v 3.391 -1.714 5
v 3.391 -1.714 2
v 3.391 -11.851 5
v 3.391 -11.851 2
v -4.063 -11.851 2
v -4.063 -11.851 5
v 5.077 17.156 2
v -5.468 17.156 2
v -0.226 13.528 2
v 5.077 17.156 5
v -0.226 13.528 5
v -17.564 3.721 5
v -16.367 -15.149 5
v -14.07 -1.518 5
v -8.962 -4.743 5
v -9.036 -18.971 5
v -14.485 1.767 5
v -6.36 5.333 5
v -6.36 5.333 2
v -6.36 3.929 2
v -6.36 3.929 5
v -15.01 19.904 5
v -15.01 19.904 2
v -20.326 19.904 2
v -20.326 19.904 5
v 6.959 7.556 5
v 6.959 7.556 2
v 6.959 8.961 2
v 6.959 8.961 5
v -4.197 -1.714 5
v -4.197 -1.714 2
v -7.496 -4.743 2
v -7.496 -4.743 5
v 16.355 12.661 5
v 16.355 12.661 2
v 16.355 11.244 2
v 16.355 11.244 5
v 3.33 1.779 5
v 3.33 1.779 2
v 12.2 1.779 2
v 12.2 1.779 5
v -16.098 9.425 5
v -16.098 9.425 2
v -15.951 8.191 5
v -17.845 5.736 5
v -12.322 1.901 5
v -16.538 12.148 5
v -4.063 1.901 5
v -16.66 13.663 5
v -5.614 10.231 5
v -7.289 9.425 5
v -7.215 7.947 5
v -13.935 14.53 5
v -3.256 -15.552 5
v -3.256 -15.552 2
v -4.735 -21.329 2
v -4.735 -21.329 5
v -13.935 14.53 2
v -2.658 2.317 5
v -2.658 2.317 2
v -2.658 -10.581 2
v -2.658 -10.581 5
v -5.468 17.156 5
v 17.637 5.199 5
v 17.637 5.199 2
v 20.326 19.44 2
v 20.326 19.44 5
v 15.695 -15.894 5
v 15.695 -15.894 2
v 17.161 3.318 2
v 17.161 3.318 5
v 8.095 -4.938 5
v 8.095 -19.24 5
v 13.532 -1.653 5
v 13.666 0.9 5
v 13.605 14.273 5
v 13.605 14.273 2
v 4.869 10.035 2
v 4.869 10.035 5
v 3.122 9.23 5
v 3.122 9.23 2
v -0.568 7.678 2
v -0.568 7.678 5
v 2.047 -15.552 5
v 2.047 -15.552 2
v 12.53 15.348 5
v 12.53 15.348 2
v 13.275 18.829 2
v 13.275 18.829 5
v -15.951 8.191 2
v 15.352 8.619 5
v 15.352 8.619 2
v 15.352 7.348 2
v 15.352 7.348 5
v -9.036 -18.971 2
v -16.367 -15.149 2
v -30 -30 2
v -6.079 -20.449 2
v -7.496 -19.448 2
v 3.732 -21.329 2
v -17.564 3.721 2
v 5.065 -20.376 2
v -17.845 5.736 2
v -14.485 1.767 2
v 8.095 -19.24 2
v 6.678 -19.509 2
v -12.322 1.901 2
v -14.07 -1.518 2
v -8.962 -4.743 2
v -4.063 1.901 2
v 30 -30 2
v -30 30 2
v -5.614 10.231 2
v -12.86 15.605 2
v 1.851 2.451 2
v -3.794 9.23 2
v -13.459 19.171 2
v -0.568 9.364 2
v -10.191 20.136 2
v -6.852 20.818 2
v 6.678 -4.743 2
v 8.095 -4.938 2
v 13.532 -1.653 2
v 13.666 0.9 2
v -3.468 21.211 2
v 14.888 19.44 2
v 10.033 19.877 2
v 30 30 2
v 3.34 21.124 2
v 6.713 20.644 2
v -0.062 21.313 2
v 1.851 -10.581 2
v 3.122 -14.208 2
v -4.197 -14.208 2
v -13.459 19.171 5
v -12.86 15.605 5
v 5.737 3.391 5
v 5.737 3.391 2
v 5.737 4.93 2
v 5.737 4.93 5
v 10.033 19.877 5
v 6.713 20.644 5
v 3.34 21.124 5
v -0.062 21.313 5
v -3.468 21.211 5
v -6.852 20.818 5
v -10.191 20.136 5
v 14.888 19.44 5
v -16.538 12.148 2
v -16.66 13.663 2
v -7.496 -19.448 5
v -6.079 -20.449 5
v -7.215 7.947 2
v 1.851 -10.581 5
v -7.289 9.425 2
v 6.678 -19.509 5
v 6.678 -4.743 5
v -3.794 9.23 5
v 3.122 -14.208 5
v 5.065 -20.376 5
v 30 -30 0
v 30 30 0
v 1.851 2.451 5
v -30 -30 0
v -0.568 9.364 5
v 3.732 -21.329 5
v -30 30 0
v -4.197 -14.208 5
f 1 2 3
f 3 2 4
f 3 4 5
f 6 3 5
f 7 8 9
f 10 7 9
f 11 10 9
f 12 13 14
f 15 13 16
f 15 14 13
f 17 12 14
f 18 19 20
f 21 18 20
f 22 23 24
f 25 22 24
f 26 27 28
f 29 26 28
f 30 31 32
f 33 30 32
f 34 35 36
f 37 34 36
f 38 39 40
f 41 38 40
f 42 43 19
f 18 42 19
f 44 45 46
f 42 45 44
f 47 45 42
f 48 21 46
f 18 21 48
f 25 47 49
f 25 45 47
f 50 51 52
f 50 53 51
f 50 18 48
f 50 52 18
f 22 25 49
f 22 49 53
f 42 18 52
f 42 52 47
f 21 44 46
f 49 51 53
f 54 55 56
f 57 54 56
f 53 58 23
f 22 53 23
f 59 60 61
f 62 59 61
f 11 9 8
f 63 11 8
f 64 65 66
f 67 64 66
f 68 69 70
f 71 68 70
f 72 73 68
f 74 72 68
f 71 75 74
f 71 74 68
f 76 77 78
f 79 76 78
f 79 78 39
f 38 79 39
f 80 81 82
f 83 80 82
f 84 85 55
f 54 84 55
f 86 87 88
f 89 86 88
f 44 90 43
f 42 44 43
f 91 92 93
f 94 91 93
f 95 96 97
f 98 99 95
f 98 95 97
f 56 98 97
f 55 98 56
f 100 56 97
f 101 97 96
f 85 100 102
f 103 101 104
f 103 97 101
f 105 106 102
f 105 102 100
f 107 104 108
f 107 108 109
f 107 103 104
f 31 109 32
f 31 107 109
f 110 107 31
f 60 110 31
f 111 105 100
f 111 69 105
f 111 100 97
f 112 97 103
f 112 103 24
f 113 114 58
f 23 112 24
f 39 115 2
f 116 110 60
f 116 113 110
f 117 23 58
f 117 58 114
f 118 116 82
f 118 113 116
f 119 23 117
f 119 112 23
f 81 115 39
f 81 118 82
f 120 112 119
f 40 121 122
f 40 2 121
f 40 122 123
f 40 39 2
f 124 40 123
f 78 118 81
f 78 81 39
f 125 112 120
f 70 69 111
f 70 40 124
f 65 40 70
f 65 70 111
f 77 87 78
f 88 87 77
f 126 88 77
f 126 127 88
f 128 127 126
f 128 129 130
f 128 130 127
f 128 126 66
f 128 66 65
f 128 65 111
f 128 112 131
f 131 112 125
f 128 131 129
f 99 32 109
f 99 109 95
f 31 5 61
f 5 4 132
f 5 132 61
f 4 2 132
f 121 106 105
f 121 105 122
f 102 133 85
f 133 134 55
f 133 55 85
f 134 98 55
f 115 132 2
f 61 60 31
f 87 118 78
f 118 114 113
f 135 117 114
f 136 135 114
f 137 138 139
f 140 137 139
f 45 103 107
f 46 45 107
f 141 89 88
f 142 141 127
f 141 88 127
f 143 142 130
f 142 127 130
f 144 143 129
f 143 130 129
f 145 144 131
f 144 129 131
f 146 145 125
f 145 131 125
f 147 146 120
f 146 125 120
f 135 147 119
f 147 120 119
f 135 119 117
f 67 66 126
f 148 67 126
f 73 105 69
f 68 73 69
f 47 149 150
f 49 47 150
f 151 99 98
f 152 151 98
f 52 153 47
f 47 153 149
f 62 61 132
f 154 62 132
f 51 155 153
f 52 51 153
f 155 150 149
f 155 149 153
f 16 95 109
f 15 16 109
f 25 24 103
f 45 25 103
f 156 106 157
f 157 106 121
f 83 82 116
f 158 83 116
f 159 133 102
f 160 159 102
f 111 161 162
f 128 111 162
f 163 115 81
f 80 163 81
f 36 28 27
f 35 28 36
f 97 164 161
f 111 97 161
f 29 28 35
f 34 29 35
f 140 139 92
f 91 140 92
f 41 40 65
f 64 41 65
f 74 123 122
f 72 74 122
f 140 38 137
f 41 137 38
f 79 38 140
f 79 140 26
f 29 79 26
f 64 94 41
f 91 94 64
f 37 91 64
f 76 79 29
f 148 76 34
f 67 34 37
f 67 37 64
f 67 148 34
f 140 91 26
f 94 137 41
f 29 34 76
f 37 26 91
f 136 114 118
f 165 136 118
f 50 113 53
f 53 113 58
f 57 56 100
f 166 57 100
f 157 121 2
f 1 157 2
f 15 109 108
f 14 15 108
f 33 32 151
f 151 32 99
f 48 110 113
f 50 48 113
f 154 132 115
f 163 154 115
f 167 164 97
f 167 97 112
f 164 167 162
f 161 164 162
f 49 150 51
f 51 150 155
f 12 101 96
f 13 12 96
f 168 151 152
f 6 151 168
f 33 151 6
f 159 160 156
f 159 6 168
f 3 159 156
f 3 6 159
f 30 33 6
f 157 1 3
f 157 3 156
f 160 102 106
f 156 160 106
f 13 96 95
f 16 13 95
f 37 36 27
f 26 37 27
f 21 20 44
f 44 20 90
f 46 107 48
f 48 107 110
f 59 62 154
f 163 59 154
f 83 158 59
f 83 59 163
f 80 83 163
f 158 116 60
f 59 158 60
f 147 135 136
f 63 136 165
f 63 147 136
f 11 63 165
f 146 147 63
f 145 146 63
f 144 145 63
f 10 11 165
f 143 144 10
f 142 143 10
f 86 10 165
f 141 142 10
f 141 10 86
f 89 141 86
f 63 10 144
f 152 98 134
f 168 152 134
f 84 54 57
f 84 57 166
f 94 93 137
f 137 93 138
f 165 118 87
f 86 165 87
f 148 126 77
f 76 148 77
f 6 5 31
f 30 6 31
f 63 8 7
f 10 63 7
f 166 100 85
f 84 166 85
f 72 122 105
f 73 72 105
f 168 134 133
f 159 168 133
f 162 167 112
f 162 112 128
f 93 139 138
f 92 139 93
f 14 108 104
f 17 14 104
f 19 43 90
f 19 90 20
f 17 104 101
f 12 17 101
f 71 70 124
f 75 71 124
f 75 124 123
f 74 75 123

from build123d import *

# Parameters (mm, degrees)
F2_DEPTH = 5
F1_W     = 60
F1_H     = 60
F3_DEPTH = 2


# Not quite as in the source:
# - ends of sketch curves that miss each other by under 0.0002 mm in the source are joined


with BuildPart() as f2:
    # F0 (on Top) → F2 (new body)
    with BuildSketch(Plane.XY):
        with BuildLine():
            Line((12.5301, 15.3483), (13.2754, 18.8292))
            ThreePointArc((13.2754, 18.8292), (-0.0620714554, 21.313337159), (-13.4587020592, 19.1710971727))
            Line((-13.4587020592, 19.1710971727), (-12.8601, 15.6049))
            Line((-12.8601, 15.6049), (-0.5682, 9.3636))
            Line((-0.5682, 9.3636), (12.5301, 15.3483))
        make_face()
        Polygon((5.0768, 17.1559), (-0.2261, 13.5284), (-5.468, 17.1559), align=None, mode=Mode.SUBTRACT)
    extrude(amount=F2_DEPTH)



with BuildPart() as f2b:
    # F0 (on Top) → F2, piece 2 (new body)
    with BuildSketch(Plane.XY):
        Polygon((20.3255, 19.4397), (14.8884, 19.4397), (13.6053, 14.2734), (4.869, 10.0354), (3.3296, 1.7791), (12.2, 1.7791), (17.6374, 5.1989), align=None)
        Polygon((15.3523, 8.6188), (15.3523, 7.3484), (5.7369, 3.3912), (5.7369, 4.9303), align=None, mode=Mode.SUBTRACT)
        Polygon((16.3548, 12.6613), (16.3548, 11.2445), (6.9587, 7.5562), (6.9587, 8.9606), align=None, mode=Mode.SUBTRACT)
    extrude(amount=F2_DEPTH)


with BuildPart() as f2c:
    # F0 (on Top) → F2, piece 3 (new body)
    with BuildSketch(Plane.XY):
        Polygon((-4.0627, 1.9012), (-5.6145, 10.2308), (-13.9352, 14.5301), (-15.0105, 19.9041), (-20.3255, 19.9041), (-17.8452, 5.7363), (-12.3223, 1.9012), align=None)
        Polygon((-16.098, 9.4248), (-6.3597, 5.3332), (-6.3597, 3.9288), (-15.9514, 8.1913), align=None, mode=Mode.SUBTRACT)
        Polygon((-16.6601, 13.6628), (-7.2887, 9.4248), (-7.2152, 7.947), (-16.5379, 12.1483), align=None, mode=Mode.SUBTRACT)
    extrude(amount=F2_DEPTH)


with BuildPart() as f2d:
    # F0 (on Top) → F2, piece 4 (new body)
    with BuildSketch(Plane.XY):
        Polygon((-14.0697, -1.5185), (-14.4852, 1.7669), (-17.5644, 3.7209), (-16.3667, -15.1486), (-9.0357, -18.9712), (-8.9623, -4.7428), align=None)
    extrude(amount=F2_DEPTH)


with BuildPart() as f2e:
    # F0 (on Top) → F2, piece 5 (new body)
    with BuildSketch(Plane.XY):
        Polygon((17.161, 3.318), (13.6663, 0.8999), (13.5321, -1.6531), (8.0952, -4.938), (8.0952, -19.2404), (15.6947, -15.8937), align=None)
    extrude(amount=F2_DEPTH)


with BuildPart() as f2f:
    # F0 (on Top) → F2, piece 6 (new body)
    with BuildSketch(Plane.XY):
        Polygon((-3.794, 9.2295), (-2.6575, 2.3167), (-2.6575, -10.5809), (1.8513, -10.5809), (1.8513, 2.4509), (3.1219, 9.2295), (-0.5682, 7.6783), align=None)
    extrude(amount=F2_DEPTH)


with BuildPart() as f2g:
    # F0 (on Top) → F2, piece 7 (new body)
    with BuildSketch(Plane.XY):
        Polygon((-7.4959, -4.7428), (-7.4959, -19.4476), (-6.0788, -20.4494), (-4.1971, -14.2084), (3.1219, -14.2084), (5.0647, -20.3757), (6.6777, -19.5086), (6.6777, -4.7428), (3.3906, -1.7137), (3.3906, -11.8511), (-4.0627, -11.8511), (-4.1971, -1.7137), align=None)
    extrude(amount=F2_DEPTH)


with BuildPart() as f2h:
    # F0 (on Top) → F2, piece 8 (new body)
    with BuildSketch(Plane.XY):
        Polygon((-3.2564, -15.5518), (-4.7349, -21.3286), (3.7325, -21.3286), (2.047, -15.5518), align=None)
    extrude(amount=F2_DEPTH)


with BuildPart() as f2_1:
    add(f2.part)

    add(f2b.part)  # F3 merges F2b

    add(f2c.part)  # F3 merges F2c

    add(f2d.part)  # F3 merges F2d

    add(f2e.part)  # F3 merges F2e

    add(f2f.part)  # F3 merges F2f

    add(f2g.part)  # F3 merges F2g

    add(f2h.part)  # F3 merges F2h
    # F1 (on Top) → F3 (join)
    with BuildSketch(Plane.XY):
        Rectangle(F1_W, F1_H)
    extrude(amount=F3_DEPTH)


solid = f2_1.part
